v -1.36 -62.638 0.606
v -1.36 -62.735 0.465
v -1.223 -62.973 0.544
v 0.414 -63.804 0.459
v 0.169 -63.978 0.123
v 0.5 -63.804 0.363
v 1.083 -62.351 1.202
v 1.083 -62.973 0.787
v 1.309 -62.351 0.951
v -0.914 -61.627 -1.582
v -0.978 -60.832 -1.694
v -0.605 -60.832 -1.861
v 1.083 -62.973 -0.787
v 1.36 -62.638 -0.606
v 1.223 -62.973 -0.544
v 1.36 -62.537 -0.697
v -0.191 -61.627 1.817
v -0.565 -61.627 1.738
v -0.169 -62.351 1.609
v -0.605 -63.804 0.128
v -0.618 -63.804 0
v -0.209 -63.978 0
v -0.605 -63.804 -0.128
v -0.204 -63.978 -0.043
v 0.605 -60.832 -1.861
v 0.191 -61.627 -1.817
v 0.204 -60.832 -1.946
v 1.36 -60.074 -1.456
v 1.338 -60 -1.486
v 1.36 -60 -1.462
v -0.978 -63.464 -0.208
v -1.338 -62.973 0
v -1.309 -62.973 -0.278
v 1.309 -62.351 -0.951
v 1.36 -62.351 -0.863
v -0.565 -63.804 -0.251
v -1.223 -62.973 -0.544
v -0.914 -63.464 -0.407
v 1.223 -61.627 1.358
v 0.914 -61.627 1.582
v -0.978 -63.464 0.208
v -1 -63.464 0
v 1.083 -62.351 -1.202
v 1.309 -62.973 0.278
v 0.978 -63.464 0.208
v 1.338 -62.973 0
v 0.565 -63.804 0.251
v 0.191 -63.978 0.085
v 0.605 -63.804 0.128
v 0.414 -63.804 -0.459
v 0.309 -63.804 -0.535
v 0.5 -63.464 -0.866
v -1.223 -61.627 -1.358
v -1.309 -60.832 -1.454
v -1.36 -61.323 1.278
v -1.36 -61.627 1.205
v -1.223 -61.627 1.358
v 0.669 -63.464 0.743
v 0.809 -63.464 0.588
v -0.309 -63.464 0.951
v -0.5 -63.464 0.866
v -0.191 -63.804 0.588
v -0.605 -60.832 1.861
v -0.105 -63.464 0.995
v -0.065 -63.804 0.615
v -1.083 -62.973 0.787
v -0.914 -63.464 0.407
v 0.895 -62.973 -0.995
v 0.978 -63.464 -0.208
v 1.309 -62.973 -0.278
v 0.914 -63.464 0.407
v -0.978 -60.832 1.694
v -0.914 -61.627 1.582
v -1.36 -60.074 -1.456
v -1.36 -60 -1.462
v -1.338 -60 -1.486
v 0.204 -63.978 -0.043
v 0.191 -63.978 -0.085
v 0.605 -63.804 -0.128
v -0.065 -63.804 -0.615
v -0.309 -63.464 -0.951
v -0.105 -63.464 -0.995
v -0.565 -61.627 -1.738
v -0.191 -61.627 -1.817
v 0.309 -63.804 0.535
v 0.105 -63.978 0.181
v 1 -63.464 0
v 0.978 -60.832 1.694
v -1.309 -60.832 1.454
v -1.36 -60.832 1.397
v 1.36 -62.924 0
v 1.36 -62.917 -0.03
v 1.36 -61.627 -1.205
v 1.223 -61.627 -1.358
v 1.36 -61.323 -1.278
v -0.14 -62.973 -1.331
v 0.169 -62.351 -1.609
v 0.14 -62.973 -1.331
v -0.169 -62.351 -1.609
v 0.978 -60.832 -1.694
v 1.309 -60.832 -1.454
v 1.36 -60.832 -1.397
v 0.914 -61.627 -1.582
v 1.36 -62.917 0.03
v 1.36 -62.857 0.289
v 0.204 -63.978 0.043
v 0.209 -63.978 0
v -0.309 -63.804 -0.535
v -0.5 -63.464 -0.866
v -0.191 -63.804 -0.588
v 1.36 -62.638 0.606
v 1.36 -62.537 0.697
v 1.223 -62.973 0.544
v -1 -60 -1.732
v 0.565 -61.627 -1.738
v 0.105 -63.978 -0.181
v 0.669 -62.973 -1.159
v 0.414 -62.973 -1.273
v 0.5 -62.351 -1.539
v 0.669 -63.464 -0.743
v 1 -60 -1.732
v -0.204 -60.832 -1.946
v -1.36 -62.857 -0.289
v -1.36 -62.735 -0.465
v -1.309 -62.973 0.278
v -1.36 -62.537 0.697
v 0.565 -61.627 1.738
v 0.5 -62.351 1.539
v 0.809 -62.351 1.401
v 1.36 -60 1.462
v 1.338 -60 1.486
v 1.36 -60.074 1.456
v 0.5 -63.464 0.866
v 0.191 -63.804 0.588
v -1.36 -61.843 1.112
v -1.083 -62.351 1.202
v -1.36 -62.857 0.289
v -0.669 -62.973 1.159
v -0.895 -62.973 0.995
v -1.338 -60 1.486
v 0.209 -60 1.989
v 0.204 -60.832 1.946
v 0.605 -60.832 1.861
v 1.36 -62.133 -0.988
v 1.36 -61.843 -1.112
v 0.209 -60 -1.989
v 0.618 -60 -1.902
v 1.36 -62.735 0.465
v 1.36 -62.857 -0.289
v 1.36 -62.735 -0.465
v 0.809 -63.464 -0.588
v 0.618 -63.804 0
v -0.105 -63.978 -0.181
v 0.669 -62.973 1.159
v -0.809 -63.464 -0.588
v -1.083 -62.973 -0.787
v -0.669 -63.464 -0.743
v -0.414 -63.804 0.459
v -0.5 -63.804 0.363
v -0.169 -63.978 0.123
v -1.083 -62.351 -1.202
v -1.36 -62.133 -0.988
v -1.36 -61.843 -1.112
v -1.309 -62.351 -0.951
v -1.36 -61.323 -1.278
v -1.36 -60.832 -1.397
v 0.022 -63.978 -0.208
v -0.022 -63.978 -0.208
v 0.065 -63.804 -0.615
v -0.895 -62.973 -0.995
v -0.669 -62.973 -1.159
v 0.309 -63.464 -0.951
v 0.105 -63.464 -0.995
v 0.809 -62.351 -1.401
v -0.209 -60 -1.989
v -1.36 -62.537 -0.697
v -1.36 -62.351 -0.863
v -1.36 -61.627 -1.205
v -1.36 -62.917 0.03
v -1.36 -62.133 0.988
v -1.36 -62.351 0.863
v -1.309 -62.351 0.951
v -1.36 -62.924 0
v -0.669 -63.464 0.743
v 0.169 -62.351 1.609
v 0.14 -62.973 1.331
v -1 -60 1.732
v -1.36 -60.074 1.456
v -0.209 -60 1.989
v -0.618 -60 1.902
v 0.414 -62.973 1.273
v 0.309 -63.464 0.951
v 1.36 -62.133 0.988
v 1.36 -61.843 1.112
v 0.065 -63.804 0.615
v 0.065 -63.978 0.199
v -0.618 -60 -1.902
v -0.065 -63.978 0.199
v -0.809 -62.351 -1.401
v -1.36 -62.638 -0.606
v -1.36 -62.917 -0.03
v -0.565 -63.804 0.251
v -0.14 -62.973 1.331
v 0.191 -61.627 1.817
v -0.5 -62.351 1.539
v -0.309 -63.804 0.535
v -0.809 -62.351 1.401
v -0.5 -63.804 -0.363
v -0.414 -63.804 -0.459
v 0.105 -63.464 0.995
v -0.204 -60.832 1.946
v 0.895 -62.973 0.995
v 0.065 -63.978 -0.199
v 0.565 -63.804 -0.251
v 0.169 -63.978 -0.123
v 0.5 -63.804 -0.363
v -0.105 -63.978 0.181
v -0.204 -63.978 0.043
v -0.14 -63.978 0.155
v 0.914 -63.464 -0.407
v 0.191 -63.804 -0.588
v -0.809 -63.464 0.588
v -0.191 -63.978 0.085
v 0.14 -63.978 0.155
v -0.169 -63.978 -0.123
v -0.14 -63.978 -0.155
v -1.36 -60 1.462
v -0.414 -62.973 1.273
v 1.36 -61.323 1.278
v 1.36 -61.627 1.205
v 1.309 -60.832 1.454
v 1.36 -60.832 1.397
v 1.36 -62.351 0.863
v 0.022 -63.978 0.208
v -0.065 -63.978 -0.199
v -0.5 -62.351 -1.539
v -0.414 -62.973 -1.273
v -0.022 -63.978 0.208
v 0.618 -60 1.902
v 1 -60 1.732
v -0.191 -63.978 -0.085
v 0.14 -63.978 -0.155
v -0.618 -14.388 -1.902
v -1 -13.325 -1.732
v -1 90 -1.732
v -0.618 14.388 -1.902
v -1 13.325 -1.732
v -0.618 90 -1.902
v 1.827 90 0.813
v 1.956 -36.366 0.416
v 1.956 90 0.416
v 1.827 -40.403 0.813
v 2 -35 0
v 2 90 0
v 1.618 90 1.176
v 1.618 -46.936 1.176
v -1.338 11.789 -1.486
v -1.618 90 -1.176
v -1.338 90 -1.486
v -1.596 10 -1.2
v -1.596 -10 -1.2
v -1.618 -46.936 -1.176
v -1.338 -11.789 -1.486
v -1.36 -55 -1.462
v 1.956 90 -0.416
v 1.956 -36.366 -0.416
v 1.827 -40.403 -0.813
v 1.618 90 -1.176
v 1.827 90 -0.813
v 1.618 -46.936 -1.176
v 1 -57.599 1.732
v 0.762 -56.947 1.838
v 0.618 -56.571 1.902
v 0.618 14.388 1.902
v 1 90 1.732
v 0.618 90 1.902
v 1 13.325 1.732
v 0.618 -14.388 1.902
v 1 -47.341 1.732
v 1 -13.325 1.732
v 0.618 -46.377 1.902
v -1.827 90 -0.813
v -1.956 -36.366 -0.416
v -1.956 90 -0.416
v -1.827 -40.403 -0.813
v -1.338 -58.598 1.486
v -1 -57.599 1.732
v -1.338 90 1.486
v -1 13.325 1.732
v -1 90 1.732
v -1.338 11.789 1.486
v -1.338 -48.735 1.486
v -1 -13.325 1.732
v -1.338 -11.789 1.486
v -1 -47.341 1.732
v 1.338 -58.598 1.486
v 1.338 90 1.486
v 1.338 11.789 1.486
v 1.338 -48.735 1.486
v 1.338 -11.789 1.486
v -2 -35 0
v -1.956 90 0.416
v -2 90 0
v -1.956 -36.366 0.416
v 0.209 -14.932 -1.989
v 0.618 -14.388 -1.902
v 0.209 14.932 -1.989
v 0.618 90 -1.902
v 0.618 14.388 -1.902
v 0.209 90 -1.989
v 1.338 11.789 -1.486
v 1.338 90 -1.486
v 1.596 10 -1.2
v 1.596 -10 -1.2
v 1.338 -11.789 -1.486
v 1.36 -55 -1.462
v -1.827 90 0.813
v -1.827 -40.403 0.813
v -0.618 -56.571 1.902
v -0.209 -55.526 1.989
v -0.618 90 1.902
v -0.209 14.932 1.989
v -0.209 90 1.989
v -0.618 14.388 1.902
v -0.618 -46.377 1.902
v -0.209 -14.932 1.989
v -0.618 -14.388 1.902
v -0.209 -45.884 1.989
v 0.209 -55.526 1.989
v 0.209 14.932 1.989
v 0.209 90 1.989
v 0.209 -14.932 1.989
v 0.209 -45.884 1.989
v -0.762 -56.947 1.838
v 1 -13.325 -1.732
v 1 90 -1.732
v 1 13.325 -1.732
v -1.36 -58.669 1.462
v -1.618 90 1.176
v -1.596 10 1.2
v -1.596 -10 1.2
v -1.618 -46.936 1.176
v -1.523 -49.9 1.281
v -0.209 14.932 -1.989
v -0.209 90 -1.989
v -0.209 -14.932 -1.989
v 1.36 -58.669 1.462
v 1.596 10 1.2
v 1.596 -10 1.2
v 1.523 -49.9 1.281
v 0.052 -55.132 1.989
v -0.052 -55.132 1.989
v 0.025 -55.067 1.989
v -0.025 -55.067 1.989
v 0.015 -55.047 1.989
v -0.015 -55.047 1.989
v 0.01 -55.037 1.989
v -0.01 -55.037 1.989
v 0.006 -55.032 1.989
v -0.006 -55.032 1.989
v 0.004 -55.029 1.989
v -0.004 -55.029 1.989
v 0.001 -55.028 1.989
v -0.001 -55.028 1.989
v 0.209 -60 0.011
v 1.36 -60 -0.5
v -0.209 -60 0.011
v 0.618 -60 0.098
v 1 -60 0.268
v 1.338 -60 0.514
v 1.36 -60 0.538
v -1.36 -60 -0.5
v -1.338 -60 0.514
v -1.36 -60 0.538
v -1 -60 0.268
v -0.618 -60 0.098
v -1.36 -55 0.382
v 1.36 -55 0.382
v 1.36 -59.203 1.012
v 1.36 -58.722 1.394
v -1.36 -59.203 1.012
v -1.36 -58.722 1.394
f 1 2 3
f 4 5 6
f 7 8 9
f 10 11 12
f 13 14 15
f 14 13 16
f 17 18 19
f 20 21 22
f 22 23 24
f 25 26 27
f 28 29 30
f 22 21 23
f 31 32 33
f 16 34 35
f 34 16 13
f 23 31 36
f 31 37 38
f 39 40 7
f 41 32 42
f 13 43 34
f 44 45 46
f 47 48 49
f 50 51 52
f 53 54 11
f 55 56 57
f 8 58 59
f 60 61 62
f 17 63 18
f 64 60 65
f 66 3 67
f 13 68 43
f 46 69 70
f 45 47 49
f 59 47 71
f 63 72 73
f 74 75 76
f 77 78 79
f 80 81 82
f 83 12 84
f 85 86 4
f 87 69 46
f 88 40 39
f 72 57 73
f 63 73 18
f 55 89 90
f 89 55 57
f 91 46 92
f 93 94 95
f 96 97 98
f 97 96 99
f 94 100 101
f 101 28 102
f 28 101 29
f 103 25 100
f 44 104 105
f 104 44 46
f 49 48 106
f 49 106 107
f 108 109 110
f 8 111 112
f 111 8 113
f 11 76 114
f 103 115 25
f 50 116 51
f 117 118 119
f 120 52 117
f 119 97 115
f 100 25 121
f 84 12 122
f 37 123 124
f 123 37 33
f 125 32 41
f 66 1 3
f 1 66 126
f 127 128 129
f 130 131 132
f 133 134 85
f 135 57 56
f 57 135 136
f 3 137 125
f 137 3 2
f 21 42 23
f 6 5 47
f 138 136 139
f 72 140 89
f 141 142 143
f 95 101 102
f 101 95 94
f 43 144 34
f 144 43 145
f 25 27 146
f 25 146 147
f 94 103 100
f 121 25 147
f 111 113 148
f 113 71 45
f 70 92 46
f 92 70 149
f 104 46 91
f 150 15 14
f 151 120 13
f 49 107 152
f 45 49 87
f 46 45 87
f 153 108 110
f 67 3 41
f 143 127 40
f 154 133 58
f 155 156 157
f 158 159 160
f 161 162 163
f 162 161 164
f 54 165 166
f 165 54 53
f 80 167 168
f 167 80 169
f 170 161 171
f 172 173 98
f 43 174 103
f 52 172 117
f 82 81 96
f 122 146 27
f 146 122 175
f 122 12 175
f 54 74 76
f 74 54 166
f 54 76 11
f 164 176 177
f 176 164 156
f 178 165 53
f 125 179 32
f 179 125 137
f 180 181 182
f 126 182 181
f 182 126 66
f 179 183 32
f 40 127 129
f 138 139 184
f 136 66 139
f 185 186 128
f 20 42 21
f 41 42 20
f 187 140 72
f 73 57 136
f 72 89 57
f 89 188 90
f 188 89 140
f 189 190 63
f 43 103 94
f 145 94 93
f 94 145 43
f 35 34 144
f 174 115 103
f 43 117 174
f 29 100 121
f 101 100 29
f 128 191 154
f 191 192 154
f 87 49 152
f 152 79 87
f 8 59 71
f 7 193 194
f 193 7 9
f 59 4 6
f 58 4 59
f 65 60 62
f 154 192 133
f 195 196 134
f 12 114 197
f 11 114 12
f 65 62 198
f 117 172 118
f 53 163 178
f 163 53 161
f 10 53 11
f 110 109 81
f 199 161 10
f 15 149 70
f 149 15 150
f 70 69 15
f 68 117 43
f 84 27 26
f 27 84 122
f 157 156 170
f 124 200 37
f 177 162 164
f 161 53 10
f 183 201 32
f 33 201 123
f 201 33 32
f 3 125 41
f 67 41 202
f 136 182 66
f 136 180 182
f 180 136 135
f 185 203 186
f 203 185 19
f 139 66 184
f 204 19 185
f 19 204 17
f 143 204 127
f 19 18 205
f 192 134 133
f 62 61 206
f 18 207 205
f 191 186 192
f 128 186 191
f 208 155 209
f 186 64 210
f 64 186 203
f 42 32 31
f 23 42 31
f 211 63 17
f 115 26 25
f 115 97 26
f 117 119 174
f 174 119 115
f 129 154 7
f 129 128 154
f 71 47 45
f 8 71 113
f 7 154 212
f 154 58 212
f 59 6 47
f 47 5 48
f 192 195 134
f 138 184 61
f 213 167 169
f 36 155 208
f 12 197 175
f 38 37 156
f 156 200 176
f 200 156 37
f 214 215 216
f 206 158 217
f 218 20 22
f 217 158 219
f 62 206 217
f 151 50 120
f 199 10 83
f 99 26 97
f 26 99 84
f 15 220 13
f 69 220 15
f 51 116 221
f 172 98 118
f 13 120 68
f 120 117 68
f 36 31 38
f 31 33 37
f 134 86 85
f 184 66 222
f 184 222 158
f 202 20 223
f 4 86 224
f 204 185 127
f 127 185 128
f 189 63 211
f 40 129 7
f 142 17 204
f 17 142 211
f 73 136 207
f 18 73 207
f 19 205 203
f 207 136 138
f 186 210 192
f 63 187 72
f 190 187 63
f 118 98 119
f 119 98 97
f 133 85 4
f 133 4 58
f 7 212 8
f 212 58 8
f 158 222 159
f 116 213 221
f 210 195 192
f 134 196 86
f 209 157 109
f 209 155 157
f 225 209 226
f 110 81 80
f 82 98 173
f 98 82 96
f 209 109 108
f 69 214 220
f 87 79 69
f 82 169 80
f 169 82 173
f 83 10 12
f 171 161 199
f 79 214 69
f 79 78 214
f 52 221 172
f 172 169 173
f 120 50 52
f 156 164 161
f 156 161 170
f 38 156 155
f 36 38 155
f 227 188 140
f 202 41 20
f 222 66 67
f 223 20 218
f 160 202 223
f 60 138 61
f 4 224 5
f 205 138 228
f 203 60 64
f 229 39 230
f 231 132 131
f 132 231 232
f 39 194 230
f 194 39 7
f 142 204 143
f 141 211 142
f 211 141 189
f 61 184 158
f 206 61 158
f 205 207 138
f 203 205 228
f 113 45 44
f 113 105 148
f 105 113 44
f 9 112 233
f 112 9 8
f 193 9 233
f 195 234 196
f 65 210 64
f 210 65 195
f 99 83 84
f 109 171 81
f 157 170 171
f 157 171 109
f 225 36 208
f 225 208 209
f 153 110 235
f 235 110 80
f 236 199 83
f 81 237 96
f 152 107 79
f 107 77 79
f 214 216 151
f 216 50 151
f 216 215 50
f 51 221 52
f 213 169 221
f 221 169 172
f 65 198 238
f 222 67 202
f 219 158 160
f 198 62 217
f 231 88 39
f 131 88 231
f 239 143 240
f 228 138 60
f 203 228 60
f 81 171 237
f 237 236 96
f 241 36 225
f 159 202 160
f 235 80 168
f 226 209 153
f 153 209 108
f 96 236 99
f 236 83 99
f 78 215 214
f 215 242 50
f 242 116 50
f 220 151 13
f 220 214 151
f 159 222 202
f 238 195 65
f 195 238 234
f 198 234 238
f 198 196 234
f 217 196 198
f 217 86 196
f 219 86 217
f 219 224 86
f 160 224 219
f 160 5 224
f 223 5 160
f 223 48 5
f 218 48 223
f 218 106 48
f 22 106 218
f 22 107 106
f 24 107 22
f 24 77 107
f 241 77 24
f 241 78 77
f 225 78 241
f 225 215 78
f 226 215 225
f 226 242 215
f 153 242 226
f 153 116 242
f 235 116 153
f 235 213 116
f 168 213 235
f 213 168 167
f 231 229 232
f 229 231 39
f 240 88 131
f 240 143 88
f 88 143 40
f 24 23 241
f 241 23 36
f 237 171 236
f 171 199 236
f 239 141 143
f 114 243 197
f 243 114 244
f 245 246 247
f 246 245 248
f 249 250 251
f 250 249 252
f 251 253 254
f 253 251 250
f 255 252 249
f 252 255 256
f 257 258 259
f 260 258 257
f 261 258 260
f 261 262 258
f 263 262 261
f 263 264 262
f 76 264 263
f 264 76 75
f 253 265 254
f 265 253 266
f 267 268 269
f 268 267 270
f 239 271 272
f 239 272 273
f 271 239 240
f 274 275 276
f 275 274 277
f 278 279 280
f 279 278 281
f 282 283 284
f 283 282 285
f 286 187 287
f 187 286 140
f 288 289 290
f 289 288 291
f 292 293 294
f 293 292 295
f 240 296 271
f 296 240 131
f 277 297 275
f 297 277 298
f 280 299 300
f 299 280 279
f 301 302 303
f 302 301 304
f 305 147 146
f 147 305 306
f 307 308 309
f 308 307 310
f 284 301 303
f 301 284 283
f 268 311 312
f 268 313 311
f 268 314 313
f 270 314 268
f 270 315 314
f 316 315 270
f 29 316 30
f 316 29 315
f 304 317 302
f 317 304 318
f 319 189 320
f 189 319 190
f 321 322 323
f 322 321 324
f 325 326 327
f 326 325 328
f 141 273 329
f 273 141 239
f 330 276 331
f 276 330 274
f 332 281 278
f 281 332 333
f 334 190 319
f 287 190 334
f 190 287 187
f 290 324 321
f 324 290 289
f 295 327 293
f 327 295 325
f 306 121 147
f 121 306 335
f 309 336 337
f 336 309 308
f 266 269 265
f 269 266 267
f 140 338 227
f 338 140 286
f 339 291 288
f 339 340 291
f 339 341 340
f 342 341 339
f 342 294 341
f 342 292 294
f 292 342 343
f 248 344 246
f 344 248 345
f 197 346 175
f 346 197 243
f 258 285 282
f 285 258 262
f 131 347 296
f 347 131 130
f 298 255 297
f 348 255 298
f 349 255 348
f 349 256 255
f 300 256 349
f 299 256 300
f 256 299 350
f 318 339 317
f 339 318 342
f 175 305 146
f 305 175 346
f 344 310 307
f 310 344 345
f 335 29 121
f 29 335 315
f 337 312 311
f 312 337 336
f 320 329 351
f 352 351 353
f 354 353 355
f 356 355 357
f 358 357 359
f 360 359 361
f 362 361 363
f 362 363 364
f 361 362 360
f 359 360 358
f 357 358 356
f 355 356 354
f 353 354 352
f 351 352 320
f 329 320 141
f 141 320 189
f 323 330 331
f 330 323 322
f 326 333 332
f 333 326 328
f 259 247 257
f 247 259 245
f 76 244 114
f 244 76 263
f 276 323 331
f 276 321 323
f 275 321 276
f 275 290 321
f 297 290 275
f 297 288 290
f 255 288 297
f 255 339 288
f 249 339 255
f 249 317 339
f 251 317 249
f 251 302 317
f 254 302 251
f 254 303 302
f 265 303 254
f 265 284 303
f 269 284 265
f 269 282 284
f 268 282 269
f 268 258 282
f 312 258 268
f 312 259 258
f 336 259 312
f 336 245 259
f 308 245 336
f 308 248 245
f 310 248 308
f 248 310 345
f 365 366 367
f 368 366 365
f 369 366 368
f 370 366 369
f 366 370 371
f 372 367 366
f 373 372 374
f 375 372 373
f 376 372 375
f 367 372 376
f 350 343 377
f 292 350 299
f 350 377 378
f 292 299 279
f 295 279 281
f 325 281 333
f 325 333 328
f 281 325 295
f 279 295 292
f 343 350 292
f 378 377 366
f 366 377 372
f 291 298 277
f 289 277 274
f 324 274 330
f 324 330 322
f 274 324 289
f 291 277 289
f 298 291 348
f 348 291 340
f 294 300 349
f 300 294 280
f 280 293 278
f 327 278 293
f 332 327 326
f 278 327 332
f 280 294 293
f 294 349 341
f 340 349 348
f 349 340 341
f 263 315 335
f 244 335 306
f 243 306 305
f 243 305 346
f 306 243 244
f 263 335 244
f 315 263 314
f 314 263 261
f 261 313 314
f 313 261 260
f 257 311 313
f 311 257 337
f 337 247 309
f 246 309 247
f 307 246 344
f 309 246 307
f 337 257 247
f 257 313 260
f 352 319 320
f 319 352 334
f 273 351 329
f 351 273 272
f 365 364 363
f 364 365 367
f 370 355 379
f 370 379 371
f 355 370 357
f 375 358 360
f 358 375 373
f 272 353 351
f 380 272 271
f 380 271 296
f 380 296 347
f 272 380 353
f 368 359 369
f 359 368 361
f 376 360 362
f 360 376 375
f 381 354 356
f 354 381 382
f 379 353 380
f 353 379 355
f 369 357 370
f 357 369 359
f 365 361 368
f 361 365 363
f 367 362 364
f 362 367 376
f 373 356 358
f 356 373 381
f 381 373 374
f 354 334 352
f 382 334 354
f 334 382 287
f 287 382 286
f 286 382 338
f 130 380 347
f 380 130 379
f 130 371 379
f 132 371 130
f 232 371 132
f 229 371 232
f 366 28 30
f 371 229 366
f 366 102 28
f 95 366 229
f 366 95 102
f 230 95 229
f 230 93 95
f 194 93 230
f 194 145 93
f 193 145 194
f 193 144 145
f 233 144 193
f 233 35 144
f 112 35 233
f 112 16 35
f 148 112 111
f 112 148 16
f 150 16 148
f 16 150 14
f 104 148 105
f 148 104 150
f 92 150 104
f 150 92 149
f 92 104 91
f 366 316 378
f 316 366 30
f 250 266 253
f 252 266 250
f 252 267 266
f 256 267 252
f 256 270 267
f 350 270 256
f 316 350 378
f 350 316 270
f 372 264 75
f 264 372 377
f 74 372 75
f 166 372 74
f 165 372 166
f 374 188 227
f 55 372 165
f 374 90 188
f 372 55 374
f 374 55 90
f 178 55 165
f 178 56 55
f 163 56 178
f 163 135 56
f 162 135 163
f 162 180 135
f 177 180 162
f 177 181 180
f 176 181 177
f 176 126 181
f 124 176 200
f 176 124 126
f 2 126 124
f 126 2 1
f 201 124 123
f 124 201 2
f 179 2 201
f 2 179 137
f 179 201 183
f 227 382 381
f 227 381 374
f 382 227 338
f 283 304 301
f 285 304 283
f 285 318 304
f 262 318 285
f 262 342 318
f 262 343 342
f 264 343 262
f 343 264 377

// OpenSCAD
/* [Overall size] */
// The diameter of the hook in mm - see http://www.karpstyles.com/crochet/hook-chart.html for US and UK sizes
diameter = 4;
d = diameter;
r = diameter/2;
length = 150; // [30:300]
/* [Hook and throat] */
// How sharply the throat slopes down from the shaft (in degrees)
throat_angle = 10;
hook_lower_angle = 90 - throat_angle;
// The length of the pointy curled-over bit
hook_length = 5;
// How long the narrowed section at the point is
narrowing_length = 10;
// How long the sloping section from shaft to narrowing is
narrowing_slope = 20;
// How much the throat narrows on each side, as a fraction of the diameter
narrowing_ratio = 0.16;
narrowing_depth = d * narrowing_ratio;
/* [Thumb rest] */
// The length of the thumb rest
grip_length = 20;
// How long the sloping sections from shaft and handle to thumb rest are
grip_slope=5;
// How thick the thumb rest is, as a fraction of the diameter
grip_thickness = 0.6;
grip_depth=d * (1 - grip_thickness)/2;
// Distance from the centre-point of the thumb rest to the tip of the point
length_above_grip = 60;
// measured from the centre-point of the thumb rest to the end of the handle
length_below_grip = length - length_above_grip;
/* [Hidden] */
hook_upper_angle = 0;

$fn = 30;

// Right-angled triangle with interior angle <angle>.
module triangle(radius, angle)
{
  o=radius*sin(angle);
  a=radius*cos(angle);
  polygon(points=[[0,0], [a,0], [a,o]]);
}

// module triangle_prism() copied from:
// https://github.com/elmom/MCAD/blob/master/regular_shapes.scad
module triangle_prism(height, radius, angle)
{
  linear_extrude(height=height, center = true) triangle(radius, angle);
}

module trapezium_prism(trap_height, flat_width, slope_width, height)
{
  max_x = slope_width + flat_width/2;
  linear_extrude(height=height, center=true)
    polygon(points=[[-max_x, 0],
                    [-flat_width/2, trap_height],
                    [flat_width/2, trap_height],
                    [max_x, 0]]);
}

module grip_side()
{
	trapezium_prism(grip_depth, grip_length, grip_slope, d);
}

module grip()
{
        translate([0, r, 0])
                rotate(a=[0, 90, 180])
                        grip_side();
        translate([0, -r, 0])
                rotate(a=[0, 90, 0])
                        grip_side();
}

module narrowing_side()
{
	trapezium_prism(narrowing_depth, narrowing_length, narrowing_slope, d);
}

module narrowing()
{
        translate(v=[r, 0, length_above_grip])
                rotate(a=[-90, 90, 0])
                        narrowing_side();
        translate(v=[-r, 0, length_above_grip])
                rotate(a=[-90, 90, 180])
                        narrowing_side();
}

module outer_shell()
{
        union()
        {
                translate (v=[0, 0, length_above_grip])
                        scale([1.0, 1.0, 2.0])
                        sphere(r = r, anglesteps = 10, sweepsteps = 10);
                translate (v=[0, 0, -length_below_grip])
                        cylinder(r = r, h = length);
        }
}

module throat()
{
        translate (v= [0 , -r/4, length_above_grip])
                rotate(a=[270, 0, 90])
                difference() {
                        triangle_prism(d, 4*d, hook_lower_angle);
                        triangle_prism(d, 4*d, hook_upper_angle);
                }
}

module hook()
{
        intersection() {
                outer_shell();
                translate(v=[0, r, length_above_grip - hook_length])
                        cylinder(h=hook_length, r1=0, r2=r, center=false);
        }
}

rotate(a=[90, 0, 0]) {
        difference() {
                union() {
                        difference()
                        {
                                outer_shell();
                                throat();
                                grip();
                        }
                        hook();
                }
		// Narrow the head, for Greater Pointiness
                narrowing();
        }
}
